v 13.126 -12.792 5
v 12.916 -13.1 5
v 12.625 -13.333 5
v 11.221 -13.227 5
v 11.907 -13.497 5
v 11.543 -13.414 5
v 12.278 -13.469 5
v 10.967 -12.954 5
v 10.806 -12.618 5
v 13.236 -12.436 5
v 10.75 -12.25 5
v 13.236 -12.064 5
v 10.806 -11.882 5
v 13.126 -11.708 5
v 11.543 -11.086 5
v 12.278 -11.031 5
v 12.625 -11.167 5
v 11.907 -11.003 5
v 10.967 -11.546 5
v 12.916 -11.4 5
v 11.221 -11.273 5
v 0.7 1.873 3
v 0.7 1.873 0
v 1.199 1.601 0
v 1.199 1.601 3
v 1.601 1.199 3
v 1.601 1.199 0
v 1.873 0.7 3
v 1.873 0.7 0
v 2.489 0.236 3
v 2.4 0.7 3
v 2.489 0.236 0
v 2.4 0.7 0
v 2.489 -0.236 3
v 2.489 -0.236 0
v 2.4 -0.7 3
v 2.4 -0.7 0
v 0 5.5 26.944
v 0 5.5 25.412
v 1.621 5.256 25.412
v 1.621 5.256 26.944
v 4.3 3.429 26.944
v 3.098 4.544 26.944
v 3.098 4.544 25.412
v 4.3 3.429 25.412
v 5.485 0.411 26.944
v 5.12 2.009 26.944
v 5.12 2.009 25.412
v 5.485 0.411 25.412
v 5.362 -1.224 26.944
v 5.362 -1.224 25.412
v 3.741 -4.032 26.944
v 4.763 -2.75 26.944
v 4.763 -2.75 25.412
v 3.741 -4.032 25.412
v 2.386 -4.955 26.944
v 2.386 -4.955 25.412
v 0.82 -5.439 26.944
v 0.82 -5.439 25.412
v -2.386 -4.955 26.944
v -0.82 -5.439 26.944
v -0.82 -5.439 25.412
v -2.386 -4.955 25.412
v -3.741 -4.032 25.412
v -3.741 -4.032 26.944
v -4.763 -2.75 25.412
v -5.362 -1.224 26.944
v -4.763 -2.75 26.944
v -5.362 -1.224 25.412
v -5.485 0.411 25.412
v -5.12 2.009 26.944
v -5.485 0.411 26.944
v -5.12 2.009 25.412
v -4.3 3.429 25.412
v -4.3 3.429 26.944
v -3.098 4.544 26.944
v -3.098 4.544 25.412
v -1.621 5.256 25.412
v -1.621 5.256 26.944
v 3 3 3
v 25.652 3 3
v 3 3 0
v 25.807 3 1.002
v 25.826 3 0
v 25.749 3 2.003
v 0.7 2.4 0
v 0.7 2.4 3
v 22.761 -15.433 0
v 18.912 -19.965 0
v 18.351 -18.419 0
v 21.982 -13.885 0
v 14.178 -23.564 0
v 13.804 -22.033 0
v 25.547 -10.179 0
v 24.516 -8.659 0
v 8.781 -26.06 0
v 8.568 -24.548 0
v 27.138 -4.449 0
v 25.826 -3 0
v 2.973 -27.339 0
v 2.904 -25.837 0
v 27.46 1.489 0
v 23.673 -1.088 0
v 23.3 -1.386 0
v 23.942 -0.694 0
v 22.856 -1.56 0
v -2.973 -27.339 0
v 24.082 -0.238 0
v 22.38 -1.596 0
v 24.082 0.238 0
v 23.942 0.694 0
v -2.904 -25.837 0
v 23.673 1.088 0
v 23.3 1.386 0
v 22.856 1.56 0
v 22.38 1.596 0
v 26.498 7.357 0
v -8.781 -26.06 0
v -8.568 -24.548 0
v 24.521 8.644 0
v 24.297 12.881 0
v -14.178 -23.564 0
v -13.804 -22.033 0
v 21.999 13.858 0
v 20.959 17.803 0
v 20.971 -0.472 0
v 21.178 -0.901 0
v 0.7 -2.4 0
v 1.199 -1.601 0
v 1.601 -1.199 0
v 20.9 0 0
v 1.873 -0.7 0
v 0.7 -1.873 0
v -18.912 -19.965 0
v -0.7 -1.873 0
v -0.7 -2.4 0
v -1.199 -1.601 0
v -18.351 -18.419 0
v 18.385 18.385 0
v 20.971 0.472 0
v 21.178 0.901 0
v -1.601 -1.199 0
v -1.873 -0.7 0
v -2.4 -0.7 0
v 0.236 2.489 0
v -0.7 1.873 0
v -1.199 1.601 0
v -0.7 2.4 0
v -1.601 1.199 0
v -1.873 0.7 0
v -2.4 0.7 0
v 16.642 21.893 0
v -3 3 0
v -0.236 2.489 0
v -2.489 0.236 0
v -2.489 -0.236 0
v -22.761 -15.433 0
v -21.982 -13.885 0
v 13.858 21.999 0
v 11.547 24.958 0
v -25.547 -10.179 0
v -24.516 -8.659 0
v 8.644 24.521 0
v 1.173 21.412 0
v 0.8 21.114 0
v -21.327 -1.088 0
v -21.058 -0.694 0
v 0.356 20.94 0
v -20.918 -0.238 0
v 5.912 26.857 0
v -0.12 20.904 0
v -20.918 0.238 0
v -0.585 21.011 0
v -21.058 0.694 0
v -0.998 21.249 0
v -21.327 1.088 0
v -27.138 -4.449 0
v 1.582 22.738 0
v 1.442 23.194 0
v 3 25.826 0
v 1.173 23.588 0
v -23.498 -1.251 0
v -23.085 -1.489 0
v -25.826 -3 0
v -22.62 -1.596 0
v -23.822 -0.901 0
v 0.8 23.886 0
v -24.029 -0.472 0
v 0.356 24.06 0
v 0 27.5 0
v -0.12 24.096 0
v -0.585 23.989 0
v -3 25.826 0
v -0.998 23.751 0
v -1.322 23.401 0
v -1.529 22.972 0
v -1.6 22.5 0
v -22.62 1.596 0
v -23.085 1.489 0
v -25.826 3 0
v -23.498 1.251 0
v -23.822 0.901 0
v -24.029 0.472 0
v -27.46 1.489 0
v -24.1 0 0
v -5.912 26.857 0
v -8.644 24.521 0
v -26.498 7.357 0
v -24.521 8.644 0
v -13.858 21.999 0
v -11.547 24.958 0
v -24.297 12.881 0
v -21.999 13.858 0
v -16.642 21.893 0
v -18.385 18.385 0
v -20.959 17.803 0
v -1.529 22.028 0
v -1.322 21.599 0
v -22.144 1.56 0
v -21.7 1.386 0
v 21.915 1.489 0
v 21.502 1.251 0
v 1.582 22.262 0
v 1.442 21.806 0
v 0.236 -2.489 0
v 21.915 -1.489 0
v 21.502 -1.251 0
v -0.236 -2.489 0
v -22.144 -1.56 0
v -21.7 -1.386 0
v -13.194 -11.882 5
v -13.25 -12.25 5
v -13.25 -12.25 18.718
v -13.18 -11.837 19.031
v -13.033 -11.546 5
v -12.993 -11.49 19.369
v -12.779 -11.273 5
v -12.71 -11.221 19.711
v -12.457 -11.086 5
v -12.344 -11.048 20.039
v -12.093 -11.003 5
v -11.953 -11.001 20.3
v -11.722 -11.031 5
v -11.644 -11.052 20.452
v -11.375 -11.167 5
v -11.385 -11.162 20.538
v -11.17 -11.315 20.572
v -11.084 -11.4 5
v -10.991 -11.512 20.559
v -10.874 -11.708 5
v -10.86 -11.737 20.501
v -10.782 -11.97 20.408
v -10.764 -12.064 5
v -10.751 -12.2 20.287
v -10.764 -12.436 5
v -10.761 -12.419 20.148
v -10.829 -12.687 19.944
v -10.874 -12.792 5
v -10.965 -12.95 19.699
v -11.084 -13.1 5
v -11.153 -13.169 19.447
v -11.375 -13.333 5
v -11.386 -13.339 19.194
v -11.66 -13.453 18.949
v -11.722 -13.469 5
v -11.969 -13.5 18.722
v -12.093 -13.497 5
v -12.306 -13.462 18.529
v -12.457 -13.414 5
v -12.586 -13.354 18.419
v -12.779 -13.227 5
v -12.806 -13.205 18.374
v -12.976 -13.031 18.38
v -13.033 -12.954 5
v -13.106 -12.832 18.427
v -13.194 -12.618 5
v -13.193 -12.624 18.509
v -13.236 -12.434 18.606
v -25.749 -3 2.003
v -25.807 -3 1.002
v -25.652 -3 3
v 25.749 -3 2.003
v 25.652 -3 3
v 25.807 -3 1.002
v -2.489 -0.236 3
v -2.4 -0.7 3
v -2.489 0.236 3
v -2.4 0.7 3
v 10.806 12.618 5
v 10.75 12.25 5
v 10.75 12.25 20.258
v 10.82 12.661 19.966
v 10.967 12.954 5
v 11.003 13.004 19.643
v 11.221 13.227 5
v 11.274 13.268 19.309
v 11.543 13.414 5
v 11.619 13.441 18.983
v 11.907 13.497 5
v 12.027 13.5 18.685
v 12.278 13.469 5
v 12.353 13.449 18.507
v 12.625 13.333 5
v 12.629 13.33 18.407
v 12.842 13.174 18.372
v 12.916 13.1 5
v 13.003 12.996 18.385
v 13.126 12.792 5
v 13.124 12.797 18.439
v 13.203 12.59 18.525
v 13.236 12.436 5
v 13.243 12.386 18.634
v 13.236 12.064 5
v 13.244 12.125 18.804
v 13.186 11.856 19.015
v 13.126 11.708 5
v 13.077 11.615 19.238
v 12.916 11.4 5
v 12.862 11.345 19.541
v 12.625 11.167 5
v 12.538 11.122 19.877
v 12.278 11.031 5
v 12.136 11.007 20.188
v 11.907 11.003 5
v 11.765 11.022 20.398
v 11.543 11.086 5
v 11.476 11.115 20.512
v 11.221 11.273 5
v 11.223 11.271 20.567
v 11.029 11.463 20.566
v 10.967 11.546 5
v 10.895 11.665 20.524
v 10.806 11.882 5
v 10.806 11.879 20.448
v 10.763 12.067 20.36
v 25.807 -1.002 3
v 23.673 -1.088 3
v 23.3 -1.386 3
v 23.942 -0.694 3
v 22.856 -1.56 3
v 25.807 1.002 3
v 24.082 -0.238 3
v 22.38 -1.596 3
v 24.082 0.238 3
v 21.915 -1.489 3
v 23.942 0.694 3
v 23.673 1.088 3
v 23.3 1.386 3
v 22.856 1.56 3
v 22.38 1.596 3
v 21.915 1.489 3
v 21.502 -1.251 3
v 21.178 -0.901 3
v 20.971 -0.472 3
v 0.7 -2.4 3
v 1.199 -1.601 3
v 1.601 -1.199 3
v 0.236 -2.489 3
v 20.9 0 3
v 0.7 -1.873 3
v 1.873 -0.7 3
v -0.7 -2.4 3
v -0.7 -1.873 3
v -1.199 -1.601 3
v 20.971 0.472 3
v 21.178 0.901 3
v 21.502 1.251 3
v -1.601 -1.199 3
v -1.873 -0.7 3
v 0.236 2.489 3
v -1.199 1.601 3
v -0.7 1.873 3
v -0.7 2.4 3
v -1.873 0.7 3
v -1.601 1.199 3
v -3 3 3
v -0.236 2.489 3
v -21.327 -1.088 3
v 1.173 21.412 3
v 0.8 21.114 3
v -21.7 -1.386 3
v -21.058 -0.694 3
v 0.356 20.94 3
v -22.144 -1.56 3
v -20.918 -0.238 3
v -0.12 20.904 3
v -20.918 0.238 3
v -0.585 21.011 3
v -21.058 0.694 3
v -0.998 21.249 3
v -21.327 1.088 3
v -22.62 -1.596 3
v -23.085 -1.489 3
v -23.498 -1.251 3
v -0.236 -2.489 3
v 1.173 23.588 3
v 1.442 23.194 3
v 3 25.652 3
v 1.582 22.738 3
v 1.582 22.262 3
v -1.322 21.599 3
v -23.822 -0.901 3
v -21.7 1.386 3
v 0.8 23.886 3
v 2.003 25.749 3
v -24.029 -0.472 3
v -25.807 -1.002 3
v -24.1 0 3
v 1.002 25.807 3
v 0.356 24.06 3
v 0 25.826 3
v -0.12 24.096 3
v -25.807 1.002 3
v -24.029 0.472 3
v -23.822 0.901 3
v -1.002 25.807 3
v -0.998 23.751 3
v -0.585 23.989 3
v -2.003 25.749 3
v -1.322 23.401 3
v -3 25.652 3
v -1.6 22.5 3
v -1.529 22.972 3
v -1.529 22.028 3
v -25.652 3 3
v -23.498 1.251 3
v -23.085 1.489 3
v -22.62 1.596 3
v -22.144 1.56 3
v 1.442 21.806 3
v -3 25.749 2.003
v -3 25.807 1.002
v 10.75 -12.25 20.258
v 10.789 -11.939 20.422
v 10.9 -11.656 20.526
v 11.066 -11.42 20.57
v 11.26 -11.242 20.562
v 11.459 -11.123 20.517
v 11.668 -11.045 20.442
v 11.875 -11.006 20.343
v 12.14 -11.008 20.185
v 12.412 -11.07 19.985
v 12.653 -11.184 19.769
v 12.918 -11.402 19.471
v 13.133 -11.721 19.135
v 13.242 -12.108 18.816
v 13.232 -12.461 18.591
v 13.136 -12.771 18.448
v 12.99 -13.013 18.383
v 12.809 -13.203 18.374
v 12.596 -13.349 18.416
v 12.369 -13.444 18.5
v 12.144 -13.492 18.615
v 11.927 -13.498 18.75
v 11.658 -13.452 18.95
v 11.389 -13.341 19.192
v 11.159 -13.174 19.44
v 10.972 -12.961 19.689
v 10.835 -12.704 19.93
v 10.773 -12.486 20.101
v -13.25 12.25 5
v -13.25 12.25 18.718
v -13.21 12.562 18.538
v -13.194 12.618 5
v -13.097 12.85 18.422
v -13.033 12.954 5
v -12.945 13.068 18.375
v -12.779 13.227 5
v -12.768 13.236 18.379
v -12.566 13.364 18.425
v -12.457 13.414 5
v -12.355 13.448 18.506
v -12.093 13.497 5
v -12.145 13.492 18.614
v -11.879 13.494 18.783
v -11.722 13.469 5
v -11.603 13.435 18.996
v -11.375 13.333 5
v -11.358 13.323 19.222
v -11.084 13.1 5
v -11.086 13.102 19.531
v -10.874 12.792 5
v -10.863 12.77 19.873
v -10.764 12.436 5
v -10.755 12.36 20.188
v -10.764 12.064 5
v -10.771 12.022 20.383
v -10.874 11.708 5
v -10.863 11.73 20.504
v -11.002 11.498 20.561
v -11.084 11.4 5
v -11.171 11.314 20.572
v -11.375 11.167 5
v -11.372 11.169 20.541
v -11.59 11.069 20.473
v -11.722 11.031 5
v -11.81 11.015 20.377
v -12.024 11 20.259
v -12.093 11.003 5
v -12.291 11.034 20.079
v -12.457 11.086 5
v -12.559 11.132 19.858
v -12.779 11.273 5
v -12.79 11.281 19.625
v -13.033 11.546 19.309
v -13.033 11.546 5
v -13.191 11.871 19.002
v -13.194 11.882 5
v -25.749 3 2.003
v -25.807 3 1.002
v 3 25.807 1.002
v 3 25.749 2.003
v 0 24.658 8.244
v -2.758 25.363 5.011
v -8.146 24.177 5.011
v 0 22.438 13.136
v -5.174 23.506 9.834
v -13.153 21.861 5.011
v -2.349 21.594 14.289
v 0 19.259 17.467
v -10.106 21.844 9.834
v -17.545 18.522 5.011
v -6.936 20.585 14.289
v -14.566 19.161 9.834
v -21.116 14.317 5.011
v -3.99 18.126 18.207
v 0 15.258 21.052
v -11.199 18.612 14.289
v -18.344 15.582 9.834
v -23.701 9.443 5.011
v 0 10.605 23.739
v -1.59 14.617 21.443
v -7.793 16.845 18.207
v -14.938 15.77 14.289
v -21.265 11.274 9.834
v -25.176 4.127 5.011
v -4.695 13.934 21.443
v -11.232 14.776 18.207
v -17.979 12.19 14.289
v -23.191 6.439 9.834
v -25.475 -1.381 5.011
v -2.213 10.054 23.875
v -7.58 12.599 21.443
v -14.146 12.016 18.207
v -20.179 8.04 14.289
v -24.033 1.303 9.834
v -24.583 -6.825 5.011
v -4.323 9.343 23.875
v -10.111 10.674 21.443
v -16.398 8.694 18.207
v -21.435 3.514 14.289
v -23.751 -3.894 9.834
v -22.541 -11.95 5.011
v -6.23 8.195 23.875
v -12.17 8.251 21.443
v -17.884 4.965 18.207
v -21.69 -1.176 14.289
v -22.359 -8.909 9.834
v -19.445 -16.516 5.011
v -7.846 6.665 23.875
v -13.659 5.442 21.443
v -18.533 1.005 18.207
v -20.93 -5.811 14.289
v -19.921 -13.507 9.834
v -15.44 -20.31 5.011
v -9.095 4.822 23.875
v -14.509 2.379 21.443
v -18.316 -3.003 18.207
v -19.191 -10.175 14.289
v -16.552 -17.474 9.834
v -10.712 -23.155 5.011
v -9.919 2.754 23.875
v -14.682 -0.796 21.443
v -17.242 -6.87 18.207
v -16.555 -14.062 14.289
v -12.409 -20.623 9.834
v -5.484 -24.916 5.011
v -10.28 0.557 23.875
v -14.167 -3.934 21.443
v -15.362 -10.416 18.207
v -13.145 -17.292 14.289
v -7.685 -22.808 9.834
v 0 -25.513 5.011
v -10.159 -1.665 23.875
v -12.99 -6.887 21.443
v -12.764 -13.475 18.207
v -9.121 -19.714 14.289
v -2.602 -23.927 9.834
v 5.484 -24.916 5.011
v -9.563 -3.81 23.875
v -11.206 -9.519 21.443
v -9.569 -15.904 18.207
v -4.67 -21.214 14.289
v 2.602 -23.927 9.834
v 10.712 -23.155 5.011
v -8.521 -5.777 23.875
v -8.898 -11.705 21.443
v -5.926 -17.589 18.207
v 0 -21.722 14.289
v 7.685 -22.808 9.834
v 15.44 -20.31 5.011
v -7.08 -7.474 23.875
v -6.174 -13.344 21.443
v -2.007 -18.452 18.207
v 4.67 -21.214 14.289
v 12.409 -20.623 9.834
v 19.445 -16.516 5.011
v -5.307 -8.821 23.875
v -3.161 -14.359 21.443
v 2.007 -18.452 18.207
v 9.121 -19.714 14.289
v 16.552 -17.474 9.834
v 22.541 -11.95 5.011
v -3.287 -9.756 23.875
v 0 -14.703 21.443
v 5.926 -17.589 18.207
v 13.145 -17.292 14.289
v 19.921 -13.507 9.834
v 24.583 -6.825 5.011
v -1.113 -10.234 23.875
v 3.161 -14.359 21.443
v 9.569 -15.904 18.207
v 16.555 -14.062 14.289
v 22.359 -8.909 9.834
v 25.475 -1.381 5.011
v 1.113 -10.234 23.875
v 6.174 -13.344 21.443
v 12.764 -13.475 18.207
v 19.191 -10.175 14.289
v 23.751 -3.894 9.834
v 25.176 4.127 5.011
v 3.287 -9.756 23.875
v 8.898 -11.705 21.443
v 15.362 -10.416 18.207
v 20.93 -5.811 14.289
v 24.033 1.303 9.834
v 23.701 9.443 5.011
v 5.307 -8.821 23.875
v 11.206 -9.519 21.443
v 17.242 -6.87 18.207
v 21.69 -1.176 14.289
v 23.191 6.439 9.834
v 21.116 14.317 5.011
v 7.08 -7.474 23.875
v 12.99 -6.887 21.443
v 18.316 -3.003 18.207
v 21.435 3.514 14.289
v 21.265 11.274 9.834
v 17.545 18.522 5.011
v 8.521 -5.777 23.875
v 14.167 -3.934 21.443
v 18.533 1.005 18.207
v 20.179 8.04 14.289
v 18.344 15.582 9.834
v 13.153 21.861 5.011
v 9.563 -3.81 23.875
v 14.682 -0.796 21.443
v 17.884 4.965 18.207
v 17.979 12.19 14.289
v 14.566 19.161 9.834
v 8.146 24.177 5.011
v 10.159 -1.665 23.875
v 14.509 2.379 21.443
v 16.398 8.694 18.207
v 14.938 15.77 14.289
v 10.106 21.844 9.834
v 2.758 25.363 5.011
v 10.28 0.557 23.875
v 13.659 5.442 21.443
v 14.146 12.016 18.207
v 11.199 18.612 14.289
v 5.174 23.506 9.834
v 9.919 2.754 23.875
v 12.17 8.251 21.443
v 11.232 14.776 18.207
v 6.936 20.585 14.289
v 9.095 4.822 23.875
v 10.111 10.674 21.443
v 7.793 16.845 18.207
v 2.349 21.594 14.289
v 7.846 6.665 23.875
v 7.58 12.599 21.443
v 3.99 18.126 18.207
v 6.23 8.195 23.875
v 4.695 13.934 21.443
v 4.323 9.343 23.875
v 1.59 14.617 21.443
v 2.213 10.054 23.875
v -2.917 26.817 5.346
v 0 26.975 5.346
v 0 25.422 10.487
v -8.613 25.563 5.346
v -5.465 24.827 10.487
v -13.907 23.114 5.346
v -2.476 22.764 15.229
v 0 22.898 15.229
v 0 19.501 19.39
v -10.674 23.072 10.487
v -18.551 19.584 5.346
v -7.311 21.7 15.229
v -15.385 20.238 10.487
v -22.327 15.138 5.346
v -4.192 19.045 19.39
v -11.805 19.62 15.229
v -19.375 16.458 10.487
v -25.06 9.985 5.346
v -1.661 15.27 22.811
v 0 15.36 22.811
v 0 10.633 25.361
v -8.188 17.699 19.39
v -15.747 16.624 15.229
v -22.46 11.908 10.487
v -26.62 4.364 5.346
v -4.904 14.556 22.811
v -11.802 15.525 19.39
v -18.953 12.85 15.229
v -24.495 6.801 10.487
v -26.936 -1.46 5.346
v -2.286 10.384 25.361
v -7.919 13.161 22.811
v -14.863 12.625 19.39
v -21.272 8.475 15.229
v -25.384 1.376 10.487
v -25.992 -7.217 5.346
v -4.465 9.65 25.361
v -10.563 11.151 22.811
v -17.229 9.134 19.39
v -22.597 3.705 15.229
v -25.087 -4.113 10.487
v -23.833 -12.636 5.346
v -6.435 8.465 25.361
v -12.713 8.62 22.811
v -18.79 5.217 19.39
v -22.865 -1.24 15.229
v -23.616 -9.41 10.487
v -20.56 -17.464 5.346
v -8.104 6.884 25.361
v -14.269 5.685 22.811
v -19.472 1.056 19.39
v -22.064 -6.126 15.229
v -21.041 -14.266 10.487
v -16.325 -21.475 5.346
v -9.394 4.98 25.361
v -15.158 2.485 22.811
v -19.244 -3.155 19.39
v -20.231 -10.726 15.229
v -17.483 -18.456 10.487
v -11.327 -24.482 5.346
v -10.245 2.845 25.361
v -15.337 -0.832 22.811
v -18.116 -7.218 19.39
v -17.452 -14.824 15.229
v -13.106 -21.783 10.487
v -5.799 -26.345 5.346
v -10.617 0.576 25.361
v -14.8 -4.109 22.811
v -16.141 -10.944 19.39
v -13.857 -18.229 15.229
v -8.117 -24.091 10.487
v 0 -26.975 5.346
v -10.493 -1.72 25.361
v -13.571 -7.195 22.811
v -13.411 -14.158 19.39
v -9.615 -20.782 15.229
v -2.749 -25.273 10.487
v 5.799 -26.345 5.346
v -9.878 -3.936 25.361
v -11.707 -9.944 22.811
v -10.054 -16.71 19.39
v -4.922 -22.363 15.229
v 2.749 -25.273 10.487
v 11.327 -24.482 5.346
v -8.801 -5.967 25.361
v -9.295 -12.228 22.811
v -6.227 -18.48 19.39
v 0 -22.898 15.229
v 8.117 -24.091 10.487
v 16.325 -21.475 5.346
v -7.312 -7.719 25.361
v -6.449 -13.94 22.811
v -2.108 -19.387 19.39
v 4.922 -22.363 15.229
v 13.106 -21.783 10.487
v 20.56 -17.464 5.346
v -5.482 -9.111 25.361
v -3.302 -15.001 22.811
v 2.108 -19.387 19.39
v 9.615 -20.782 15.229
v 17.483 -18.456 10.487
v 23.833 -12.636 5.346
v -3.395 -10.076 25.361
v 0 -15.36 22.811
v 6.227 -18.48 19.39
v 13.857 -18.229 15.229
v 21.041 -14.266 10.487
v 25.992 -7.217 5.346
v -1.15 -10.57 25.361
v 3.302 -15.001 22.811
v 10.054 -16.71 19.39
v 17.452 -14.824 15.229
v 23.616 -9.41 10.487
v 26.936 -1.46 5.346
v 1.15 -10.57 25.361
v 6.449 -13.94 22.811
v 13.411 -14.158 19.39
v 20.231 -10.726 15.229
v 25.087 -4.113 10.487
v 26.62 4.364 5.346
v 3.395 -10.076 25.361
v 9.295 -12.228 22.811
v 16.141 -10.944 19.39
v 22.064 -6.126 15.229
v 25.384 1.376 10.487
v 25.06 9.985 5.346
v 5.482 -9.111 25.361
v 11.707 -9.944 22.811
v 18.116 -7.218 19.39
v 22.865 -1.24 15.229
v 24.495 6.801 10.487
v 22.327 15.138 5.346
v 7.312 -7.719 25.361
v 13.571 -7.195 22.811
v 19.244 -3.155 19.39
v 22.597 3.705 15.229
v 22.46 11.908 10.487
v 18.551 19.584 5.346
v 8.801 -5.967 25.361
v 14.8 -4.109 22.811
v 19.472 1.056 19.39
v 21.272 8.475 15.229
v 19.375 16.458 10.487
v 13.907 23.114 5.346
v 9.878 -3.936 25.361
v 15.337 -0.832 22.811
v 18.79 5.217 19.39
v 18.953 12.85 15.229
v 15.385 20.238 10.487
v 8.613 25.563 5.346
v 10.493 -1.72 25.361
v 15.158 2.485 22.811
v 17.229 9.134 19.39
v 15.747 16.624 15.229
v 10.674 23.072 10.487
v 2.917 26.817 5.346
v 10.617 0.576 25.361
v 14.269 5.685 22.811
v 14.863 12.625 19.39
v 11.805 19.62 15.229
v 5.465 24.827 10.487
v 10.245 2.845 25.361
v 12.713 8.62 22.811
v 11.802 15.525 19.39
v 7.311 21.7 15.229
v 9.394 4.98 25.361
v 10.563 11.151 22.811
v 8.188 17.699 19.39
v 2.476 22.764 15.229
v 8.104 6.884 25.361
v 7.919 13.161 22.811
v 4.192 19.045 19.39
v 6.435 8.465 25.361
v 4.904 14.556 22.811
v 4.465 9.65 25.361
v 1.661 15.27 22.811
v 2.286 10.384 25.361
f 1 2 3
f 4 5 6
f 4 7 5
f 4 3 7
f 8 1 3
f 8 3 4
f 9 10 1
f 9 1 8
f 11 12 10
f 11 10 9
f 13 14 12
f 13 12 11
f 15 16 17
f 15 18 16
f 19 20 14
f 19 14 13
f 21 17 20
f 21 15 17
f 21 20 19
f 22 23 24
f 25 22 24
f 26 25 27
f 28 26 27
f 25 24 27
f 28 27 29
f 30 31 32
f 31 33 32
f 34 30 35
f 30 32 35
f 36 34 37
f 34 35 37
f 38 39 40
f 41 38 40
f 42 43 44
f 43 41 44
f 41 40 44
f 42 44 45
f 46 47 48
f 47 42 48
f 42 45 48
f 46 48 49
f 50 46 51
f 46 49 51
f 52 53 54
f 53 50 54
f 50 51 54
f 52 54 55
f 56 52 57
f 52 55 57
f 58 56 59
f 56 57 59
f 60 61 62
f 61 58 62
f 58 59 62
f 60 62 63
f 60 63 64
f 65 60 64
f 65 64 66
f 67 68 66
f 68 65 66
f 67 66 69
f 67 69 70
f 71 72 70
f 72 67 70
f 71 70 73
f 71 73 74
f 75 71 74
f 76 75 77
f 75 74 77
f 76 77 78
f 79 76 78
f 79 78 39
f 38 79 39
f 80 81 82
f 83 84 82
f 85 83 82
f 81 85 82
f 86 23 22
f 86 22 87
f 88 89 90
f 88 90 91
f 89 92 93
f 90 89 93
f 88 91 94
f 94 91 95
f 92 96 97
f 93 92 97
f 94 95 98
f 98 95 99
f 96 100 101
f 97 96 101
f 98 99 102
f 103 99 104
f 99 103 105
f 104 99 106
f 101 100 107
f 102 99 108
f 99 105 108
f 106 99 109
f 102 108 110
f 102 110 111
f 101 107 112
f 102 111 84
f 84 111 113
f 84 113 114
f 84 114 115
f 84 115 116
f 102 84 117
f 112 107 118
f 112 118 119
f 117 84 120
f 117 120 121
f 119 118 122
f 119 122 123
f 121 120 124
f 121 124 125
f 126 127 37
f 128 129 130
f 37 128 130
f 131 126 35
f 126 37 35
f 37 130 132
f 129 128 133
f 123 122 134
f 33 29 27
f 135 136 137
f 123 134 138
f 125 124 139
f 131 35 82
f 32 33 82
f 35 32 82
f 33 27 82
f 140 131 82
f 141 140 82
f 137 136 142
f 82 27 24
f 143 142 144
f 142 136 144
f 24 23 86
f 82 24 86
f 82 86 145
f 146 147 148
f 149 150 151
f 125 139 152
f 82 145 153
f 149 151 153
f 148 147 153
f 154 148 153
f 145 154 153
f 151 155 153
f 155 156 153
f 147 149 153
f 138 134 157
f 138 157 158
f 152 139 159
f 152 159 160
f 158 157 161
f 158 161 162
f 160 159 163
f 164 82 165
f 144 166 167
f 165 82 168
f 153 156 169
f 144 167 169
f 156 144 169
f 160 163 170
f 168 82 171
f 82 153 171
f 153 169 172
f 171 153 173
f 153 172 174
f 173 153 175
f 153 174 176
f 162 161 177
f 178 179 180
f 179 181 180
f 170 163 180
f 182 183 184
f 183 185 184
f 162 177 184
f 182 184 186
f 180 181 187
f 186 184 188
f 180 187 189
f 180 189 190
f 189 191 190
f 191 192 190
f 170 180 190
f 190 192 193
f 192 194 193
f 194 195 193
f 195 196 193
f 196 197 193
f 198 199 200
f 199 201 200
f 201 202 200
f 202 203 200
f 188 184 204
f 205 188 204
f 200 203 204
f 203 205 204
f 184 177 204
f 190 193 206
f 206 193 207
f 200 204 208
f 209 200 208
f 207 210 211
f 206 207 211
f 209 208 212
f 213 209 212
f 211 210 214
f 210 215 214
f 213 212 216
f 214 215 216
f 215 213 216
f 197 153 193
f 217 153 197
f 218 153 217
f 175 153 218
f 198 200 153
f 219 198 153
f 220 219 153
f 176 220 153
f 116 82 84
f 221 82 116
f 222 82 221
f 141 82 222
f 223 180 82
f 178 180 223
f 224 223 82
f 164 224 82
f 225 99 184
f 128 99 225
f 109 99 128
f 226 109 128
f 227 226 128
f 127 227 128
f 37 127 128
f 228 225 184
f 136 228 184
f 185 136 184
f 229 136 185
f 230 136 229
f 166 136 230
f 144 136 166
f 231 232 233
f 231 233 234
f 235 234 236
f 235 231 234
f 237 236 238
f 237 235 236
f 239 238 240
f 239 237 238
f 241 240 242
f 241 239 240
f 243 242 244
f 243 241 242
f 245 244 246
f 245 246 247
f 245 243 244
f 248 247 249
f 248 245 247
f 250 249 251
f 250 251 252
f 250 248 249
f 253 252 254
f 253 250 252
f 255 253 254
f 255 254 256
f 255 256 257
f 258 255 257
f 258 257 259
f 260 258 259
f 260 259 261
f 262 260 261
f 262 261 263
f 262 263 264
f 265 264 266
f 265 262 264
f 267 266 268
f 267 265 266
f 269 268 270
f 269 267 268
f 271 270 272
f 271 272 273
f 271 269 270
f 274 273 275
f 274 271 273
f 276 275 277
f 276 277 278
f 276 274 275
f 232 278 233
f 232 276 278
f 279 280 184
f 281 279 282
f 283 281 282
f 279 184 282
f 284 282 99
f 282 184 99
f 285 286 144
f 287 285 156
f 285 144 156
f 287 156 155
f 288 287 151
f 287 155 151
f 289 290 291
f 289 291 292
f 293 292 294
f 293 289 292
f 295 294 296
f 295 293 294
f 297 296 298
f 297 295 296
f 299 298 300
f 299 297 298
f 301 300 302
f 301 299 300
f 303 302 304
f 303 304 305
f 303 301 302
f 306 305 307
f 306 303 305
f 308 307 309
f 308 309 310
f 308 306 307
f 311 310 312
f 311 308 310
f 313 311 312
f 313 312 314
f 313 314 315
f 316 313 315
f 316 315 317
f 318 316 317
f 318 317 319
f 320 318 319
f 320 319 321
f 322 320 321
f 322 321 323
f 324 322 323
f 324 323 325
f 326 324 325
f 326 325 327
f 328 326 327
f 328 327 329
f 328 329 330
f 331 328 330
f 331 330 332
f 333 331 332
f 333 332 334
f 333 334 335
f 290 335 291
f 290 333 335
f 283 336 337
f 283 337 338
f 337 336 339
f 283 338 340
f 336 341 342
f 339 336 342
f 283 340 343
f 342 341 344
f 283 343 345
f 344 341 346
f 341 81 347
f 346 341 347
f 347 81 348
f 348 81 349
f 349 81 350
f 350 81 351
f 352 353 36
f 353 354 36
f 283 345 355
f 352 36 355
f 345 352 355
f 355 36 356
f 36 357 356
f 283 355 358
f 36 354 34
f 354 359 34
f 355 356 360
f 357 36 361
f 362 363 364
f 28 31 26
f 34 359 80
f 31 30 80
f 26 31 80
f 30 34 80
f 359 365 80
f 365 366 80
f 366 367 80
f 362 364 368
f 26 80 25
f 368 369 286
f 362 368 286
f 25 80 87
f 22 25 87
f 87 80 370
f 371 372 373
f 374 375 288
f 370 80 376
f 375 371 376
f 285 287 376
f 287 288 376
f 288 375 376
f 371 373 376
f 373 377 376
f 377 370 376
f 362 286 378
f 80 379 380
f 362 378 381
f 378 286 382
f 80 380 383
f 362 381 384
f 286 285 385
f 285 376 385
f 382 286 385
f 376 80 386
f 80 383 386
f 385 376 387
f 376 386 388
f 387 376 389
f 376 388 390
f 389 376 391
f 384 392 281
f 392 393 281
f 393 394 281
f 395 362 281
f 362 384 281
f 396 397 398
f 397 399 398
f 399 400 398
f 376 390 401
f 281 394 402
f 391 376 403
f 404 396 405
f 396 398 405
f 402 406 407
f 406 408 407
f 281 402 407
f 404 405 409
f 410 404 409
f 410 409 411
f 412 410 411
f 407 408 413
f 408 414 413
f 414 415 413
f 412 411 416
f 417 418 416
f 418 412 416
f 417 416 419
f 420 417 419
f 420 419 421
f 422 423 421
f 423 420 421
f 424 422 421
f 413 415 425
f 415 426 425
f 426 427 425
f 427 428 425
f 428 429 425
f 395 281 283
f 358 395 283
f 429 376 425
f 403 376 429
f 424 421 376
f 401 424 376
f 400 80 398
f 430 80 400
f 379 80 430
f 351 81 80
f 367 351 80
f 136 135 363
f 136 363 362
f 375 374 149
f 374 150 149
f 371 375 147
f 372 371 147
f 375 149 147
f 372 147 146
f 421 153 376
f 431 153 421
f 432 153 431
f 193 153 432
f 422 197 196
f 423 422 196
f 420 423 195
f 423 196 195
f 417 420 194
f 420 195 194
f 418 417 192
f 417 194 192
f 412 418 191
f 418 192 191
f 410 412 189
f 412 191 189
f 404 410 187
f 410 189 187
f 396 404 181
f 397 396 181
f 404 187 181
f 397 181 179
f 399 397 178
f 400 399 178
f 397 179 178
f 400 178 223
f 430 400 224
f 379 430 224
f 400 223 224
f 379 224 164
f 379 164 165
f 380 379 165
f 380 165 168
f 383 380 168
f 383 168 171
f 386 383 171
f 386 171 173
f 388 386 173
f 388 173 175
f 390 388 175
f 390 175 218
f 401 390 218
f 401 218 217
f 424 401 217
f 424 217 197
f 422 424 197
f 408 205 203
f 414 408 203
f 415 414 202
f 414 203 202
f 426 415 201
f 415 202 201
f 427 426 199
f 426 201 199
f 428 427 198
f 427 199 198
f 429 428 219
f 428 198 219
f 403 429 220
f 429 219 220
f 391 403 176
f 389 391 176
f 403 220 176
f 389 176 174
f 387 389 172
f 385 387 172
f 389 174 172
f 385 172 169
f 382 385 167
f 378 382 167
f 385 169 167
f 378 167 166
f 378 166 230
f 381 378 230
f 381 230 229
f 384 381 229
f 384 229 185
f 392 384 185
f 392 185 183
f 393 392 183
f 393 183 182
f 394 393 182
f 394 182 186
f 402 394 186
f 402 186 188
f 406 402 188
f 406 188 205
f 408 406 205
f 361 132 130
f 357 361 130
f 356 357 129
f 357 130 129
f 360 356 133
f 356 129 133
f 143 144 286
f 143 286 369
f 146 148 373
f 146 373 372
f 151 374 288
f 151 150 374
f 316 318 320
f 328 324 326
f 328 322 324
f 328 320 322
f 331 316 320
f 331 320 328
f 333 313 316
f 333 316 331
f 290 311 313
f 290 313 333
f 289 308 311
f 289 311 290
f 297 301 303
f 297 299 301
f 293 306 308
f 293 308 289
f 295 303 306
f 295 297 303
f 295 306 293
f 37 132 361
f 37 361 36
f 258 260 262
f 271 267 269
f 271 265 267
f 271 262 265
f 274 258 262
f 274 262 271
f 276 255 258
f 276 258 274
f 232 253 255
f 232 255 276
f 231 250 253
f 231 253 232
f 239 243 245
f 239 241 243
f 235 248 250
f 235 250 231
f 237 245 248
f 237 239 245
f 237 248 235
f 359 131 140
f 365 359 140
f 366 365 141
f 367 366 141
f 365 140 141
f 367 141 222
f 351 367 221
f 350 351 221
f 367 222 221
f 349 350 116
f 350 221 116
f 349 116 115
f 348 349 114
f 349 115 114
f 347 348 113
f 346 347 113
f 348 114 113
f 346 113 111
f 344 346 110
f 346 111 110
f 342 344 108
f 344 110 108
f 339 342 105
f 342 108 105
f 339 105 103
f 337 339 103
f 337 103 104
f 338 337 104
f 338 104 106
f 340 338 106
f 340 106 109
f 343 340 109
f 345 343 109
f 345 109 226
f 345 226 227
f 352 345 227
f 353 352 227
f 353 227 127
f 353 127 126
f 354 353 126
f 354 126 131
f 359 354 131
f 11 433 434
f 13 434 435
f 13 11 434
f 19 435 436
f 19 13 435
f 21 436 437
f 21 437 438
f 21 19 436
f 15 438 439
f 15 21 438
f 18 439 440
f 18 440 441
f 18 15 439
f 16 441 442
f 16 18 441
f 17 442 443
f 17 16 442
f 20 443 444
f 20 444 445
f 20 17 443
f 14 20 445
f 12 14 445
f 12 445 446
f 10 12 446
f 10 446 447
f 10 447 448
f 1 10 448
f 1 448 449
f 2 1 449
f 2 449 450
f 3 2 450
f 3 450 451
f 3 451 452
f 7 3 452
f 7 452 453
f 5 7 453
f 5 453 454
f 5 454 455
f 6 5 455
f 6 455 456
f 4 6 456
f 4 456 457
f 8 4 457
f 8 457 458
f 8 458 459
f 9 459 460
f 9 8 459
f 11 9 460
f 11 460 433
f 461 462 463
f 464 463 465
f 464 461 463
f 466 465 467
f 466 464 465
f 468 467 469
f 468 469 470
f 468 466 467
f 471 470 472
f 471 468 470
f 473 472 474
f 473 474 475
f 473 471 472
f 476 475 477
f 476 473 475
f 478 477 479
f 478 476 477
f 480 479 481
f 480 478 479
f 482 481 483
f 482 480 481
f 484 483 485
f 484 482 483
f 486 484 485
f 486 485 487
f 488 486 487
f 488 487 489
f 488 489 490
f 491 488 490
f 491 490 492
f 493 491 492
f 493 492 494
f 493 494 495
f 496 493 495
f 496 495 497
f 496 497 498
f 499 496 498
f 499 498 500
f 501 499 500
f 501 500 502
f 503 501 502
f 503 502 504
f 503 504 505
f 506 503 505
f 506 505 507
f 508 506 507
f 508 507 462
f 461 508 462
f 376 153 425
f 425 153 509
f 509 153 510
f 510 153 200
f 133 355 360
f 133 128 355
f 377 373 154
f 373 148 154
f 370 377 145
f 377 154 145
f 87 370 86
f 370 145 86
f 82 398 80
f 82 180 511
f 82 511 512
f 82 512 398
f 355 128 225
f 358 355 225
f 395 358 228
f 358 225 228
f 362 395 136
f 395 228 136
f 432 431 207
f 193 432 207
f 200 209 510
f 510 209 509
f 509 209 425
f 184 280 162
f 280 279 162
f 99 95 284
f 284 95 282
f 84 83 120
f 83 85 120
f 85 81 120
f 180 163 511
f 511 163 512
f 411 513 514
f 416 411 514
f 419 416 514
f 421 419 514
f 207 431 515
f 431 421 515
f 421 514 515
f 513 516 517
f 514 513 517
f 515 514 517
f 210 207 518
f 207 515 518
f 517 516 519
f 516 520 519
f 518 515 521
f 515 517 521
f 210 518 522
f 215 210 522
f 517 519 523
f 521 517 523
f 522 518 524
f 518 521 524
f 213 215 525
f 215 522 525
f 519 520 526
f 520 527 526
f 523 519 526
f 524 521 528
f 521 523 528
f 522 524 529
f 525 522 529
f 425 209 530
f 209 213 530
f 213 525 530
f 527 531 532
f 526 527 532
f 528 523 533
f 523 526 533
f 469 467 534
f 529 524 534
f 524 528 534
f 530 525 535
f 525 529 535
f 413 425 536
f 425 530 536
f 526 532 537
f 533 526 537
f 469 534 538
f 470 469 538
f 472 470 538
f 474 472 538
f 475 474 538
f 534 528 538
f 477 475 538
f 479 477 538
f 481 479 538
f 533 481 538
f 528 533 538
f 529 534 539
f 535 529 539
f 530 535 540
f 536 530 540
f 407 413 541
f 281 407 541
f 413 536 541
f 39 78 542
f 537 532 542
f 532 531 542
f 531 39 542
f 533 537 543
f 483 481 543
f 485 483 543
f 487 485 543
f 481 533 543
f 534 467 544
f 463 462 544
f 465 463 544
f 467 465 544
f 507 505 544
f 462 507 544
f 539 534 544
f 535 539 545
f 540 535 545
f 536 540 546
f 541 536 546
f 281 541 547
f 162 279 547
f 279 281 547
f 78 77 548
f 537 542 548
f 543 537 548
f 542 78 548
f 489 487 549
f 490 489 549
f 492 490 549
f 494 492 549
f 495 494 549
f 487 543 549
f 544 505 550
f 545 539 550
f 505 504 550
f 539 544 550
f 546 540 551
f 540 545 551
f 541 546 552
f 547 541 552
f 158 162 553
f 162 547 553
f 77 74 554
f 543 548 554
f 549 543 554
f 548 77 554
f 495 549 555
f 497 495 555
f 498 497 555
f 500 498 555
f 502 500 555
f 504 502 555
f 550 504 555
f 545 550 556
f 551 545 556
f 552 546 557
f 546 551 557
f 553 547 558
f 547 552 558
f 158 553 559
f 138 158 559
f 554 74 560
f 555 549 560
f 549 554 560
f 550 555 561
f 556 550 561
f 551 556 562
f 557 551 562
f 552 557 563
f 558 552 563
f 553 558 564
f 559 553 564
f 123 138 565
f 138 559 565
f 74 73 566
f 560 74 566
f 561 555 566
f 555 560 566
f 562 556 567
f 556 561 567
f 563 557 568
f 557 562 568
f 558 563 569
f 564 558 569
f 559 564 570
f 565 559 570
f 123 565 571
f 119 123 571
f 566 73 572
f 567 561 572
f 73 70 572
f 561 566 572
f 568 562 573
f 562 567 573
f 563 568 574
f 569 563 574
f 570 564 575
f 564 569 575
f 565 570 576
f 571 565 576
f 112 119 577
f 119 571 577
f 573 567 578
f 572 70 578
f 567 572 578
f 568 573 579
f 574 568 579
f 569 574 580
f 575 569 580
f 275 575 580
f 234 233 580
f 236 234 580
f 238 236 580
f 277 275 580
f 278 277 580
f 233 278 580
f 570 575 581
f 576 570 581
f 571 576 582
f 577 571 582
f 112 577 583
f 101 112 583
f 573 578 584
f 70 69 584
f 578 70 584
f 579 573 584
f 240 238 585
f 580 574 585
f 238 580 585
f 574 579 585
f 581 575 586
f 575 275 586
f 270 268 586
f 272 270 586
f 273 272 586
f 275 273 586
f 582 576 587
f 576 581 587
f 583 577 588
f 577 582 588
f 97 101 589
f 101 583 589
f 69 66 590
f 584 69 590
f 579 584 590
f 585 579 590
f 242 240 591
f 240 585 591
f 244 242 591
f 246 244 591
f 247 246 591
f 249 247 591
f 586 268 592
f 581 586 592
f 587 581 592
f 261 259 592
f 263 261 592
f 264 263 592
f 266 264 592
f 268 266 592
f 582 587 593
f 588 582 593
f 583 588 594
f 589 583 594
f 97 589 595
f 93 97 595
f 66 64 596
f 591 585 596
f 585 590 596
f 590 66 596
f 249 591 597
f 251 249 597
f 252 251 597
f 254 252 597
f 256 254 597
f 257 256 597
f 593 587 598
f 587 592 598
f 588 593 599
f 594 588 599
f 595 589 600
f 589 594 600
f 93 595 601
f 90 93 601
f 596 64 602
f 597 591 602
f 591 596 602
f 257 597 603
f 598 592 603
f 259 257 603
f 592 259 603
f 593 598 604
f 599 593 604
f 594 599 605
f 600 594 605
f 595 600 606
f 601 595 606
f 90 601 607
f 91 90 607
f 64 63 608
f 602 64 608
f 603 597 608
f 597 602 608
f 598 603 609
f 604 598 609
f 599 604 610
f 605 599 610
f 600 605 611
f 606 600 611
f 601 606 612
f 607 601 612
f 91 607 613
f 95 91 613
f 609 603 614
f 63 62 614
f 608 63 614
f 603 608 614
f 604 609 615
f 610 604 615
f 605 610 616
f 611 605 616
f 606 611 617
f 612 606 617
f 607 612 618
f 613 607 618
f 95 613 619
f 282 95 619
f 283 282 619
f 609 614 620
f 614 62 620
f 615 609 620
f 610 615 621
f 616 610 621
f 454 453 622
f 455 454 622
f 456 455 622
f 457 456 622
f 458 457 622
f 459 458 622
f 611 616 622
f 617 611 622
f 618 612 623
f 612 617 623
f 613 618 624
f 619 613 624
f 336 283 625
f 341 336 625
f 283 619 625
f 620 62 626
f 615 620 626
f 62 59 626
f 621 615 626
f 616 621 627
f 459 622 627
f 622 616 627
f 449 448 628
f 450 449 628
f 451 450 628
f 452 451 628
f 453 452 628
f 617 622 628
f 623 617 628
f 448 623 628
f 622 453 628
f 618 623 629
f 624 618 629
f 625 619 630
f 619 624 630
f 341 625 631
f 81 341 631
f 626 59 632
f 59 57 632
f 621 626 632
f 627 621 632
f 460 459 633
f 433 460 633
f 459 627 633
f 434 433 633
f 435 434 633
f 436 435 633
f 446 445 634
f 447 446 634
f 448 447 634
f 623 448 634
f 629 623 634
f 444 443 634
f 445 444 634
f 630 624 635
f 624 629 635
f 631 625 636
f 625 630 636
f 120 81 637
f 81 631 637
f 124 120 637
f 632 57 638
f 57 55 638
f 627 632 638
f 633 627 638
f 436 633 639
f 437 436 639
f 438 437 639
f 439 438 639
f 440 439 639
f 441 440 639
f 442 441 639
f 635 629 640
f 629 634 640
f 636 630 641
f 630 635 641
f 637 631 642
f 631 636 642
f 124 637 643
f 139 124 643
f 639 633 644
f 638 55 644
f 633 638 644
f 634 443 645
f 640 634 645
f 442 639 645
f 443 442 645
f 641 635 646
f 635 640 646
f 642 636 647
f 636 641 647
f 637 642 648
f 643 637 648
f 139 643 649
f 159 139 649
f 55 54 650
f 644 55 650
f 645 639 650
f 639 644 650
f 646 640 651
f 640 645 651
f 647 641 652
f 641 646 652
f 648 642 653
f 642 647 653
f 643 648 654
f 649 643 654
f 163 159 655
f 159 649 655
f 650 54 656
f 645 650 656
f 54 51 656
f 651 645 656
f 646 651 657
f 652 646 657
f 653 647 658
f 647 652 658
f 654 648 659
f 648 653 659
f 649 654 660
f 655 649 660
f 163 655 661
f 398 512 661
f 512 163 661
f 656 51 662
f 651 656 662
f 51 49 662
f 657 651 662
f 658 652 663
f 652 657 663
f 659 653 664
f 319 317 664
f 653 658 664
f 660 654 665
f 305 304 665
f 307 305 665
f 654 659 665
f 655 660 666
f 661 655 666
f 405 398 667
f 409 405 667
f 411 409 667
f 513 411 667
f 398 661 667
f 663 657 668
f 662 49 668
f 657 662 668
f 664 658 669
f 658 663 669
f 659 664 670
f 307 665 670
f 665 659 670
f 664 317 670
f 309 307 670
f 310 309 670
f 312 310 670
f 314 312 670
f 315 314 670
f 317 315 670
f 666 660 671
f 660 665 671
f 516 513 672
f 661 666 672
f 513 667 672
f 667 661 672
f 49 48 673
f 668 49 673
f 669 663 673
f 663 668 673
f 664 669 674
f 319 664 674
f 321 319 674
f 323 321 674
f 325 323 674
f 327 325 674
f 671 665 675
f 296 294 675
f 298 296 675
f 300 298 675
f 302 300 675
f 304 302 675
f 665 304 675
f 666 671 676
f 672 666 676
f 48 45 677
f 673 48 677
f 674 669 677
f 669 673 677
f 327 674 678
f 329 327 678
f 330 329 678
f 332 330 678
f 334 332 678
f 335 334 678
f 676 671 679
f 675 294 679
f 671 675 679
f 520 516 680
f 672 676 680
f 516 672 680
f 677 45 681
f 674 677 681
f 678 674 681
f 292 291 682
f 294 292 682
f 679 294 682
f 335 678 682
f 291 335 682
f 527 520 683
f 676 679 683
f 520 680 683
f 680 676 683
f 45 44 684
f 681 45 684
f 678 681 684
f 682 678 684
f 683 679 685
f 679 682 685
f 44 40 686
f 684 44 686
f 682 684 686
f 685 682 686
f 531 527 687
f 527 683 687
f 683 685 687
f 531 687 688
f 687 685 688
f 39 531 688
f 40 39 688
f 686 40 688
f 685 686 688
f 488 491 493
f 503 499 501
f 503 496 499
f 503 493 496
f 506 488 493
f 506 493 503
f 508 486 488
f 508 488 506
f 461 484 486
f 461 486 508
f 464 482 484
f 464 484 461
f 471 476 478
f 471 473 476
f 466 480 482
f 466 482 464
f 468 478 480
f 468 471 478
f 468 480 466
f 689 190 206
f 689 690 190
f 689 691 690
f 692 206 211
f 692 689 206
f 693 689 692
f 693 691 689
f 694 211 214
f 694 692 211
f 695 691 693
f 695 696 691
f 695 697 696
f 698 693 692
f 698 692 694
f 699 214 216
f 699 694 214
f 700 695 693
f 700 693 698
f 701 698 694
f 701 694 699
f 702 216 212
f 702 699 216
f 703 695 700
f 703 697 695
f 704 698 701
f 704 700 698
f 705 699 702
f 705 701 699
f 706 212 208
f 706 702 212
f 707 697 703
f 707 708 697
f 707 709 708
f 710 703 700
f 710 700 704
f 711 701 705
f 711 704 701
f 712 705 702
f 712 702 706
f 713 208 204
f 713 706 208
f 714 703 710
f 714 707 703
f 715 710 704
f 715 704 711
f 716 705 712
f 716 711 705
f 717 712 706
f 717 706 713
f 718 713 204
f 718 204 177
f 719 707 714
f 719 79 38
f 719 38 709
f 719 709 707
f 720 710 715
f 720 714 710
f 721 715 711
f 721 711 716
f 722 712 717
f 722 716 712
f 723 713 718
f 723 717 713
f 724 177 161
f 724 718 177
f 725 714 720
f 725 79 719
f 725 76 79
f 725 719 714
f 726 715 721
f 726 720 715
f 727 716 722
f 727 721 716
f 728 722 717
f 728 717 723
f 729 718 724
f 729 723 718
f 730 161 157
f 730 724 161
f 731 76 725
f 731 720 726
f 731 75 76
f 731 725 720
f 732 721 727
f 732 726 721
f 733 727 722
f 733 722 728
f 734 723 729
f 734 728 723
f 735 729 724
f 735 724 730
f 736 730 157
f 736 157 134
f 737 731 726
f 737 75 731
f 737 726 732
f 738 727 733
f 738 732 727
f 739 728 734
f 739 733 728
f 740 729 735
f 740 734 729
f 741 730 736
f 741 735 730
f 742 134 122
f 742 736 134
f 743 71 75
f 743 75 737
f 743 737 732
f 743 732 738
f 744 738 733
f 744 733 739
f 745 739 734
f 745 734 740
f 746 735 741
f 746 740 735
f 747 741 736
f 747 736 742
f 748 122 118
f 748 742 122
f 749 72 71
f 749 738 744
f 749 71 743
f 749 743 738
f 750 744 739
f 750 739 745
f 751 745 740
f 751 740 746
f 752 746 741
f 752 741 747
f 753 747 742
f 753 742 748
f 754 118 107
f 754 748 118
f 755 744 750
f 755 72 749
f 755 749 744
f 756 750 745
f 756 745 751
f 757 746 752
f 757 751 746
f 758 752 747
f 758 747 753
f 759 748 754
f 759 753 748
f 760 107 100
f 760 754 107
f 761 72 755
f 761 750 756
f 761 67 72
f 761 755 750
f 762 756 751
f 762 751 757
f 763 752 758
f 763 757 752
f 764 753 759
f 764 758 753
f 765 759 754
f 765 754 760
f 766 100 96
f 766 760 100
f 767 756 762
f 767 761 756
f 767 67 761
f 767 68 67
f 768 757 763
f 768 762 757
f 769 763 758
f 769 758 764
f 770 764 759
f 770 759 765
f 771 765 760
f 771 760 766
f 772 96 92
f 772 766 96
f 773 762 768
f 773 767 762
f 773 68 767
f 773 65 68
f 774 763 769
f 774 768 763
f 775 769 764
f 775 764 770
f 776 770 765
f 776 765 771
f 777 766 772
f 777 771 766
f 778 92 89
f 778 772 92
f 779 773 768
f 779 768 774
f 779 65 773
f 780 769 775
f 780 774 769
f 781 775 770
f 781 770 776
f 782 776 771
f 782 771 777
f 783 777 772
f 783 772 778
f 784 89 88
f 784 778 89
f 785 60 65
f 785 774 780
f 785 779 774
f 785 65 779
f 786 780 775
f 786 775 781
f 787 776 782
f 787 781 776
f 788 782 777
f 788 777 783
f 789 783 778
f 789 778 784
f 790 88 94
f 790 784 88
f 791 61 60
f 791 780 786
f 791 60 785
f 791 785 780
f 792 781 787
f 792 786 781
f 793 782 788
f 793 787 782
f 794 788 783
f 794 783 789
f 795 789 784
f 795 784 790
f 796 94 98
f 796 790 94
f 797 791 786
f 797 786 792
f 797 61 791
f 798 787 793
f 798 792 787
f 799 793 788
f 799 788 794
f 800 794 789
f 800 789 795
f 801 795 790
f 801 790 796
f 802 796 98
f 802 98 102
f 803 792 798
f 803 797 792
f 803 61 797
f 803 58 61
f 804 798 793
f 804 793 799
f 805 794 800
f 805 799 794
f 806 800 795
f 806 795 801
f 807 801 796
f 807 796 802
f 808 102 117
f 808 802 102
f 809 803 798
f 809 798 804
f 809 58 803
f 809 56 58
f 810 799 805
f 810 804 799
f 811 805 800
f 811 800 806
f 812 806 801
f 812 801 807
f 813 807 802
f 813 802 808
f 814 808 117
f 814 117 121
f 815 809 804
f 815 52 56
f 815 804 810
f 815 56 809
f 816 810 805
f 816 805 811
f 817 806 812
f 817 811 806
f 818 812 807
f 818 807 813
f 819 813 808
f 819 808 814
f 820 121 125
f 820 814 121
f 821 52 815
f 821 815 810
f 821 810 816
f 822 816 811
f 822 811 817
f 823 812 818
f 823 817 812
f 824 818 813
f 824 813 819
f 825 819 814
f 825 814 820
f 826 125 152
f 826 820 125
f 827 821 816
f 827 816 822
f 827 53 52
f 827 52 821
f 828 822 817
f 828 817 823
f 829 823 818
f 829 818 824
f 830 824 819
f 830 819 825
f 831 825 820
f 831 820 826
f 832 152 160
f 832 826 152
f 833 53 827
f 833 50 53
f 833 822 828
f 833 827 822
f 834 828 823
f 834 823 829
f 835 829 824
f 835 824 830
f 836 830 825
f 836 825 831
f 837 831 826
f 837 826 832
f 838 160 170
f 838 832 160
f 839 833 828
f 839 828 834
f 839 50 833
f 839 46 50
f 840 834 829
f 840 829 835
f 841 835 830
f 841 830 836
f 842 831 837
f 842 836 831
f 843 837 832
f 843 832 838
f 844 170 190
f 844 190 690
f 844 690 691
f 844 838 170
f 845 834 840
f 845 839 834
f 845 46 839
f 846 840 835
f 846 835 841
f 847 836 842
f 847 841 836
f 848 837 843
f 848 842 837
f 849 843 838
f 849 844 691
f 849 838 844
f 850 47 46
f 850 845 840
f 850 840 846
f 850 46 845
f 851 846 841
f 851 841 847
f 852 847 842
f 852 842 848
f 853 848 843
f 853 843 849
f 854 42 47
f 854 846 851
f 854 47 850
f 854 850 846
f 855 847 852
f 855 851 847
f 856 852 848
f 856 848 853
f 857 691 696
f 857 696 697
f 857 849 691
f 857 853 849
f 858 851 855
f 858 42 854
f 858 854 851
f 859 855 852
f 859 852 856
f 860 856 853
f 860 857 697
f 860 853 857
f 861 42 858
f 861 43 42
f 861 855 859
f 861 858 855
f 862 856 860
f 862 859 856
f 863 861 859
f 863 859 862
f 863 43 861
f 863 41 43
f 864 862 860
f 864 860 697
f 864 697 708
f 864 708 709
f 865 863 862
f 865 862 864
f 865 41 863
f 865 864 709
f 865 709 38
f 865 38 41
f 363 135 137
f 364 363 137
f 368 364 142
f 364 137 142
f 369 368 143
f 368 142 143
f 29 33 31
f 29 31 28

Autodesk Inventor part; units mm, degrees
ref_plane "YZ Plane" through (0, 0, 0) normal (1, 0, 0) x (0, 1, 0)
ref_plane "XZ Plane" through (0, 0, 0) normal (0, 1, 0) x (-1, 0, 0)
sketch "Sketch4" plane through (0, 0, 0) normal (1, 0, 0) x (0, 1, 0)
  circle A0 centre (0, 0) radius 27.5
  circle A1 centre (0, 0) radius 26
  line L0 (0, 0) -> (0, 27.5)
  line L1 (0, 27.5) -> (5.5, 27.5)
  line L2 (5.5, 27.5) -> (5.5, 25.4116)
  line L3 (0, 27.5) -> (-5.5, 27.5)
  line L4 (-5.5, 27.5) -> (-5.5, 25.4116)
  line L5 (27.5, 0) -> (-27.5, 0)
  point P0 (26, 0)
  point P1 (5.5, 26.9444)
  dimension "d20" = 55
  dimension "d21" = 52
  dimension "d22" = 5.5
  dimension "d23" = 5.5
revolve "Revolution2" add sketch "Sketch4" angle 360 about axis through (0, 0, 0) along (0, 0, 1) contours L5 A1 L2 A0
ref_plane "Work Plane1" through (0, 0, 5) normal (0, 0, -1) x (-1, 0, 0)
sketch "Sketch5" plane through (0, 0, 5) normal (0, 0, -1) x (-1, 0, 0)
  line L0 (-12, -12.25) -> (12, -12.25)
  line L1 (12, -12.25) -> (12, 12.25)
  line L2 (12, 12.25) -> (-12, 12.25)
  line L3 (-12, 12.25) -> (-12, -12.25)
  line L4 (-12, -12.25) -> (12, 12.25) construction
  line L5 (12, -12.25) -> (-12, 12.25) construction
  circle A0 centre (-12, 12.25) radius 1.25
  circle A1 centre (12, 12.25) radius 1.25
  circle A2 centre (12, -12.25) radius 1.25
  circle A3 centre (-12, -12.25) radius 1.25
  point P0 (0, 0)
  dimension "d26" = 24
  dimension "d27" = 24.5
  dimension "d28" = 2.5
extrude "Extrusion3" add sketch "Sketch5" against normal up to surface contours L3 A3 L0 | L0 A3 L3 | A2 L1 L0 | L0 L1 A2 | A0 L2 L3 | L3 L2 A0 | A1 L2 L1 | L1 L2 A1
sketch "Sketch6" plane through (0, 0, 0) normal (0, 0, -1) x (-1, 0, 0)
  circle A0 centre (0, 0) radius 26 projected
  line L0 (-26, 0) -> (-26.75, 0)
  line L1 (-26.75, 0) -> (-26.75, 3)
  line L2 (-26.75, 3) -> (26.75, 3)
  line L3 (26.75, 3) -> (26.75, -3)
  line L4 (26.75, -3) -> (-26.75, -3)
  line L5 (-26.75, -3) -> (-26.75, 3)
  line L6 (0, 26) -> (0, 26.75)
  line L7 (0, 26.75) -> (3, 26.75)
  line L8 (3, 26.75) -> (-3, 26.75)
  line L9 (-3, 26.75) -> (-3, -26.75)
  line L10 (-3, -26.75) -> (3, -26.75)
  line L11 (3, -26.75) -> (3, 26.75)
  point P0 (-3, 3)
  point P1 (-25.8263, 3)
  point P2 (-25.8263, -3)
  point P3 (25.8263, -3)
  point P4 (25.8263, 3)
  point P5 (3, 3)
  point P6 (3, 25.8263)
  point P7 (-3, 25.8263)
  point P8 (3, -25.8263)
  point P9 (-3, -25.8263)
  point P10 (3, -3)
  point P11 (-3, -3)
  dimension "d31" = 0.75
  dimension "d32" = 3
  dimension "d33" = 53.5
  dimension "d34" = 6
  dimension "d35" = 0.75
  dimension "d36" = 3
  dimension "d37" = 6
  dimension "d38" = 53.5
extrude "Extrusion4" add sketch "Sketch6" against normal blind 3 contours A0 L4 L11 L2 | L11 L2 L9 A0 | L11 L4 L9 L2 | L9 L4 A0 L2
sketch "Sketch7" plane through (0, 0, 0) normal (0, 0, -1) x (-1, 0, 0)
  line L0 (0, 0) -> (22.5, 0)
  line L1 (0, 0) -> (-22.5, 0)
  line L2 (0, 0) -> (0, 22.5)
  circle A0 centre (0, 22.5) radius 1.6
  circle A1 centre (-22.5, 0) radius 1.6
  circle A2 centre (22.5, 0) radius 1.6
  dimension "d41" = 22.5
  dimension "d42" = 22.5
  dimension "d43" = 22.5
  dimension "d44" = 3.2
  dimension "d45" = 3.2
  dimension "d46" = 3.2
extrude "Extrusion5" cut sketch "Sketch7" against normal up to surface
sketch "Sketch8" plane through (0, 0, 0) normal (0, 0, -1) x (-1, 0, 0)
  circle A0 centre (0, 0) radius 2.5
  circle A1 centre (0, 0) radius 2
  line L0 (2.5, -0.7) -> (-2.5, -0.7)
  line L1 (-2.5, -0.7) -> (-2.5, 0.7)
  line L2 (-2.5, 0.7) -> (2.5, 0.7)
  line L3 (2.5, 0.7) -> (2.5, -0.7)
  line L4 (2.5, -0.7) -> (-2.5, 0.7) construction
  line L5 (-2.5, -0.7) -> (2.5, 0.7) construction
  line L6 (-0.7, -2.5) -> (-0.7, 2.5)
  line L7 (-0.7, 2.5) -> (0.7, 2.5)
  line L8 (0.7, 2.5) -> (0.7, -2.5)
  line L9 (0.7, -2.5) -> (-0.7, -2.5)
  line L10 (-0.7, -2.5) -> (0.7, 2.5) construction
  line L11 (-0.7, 2.5) -> (0.7, -2.5) construction
  point P0 (-0.7, 1.8735)
  point P1 (-1.8735, 0.7)
  point P2 (-2.4, 0.7)
  point P3 (-2.4, -0.7)
  point P4 (-1.8735, -0.7)
  point P5 (-0.7, -1.8735)
  point P6 (-0.7, -2.4)
  point P7 (0.7, -2.4)
  point P8 (0.7, -1.8735)
  point P9 (1.8735, -0.7)
  point P10 (2.4, -0.7)
  point P11 (2.4, 0.7)
  point P12 (1.8735, 0.7)
  point P13 (0.7, 1.8735)
  point P14 (0.7, 2.4)
  point P15 (-0.7, 2.4)
  dimension "d49" = 5
  dimension "d50" = 4
  dimension "d51" = 1.4
  dimension "d52" = 1.4
extrude "Extrusion6" cut sketch "Sketch8" against normal blind 10 contours A0 L0 A1 L2 | L8 A1 L6 A0 | L2 L8 A1 | A1 L0 L8 L2 | A0 L6 A1 L8 | A1 L8 L0 | L8 L2 L6 A1 | L8 L0 L6 L2 | A1 L6 L0 L8 | L6 L2 A1 | L6 L0 A1 L2 | A1 L0 L6 | L2 A1 L0 A0
equation "\"d39\" = d32"
properties part number "Eye"
